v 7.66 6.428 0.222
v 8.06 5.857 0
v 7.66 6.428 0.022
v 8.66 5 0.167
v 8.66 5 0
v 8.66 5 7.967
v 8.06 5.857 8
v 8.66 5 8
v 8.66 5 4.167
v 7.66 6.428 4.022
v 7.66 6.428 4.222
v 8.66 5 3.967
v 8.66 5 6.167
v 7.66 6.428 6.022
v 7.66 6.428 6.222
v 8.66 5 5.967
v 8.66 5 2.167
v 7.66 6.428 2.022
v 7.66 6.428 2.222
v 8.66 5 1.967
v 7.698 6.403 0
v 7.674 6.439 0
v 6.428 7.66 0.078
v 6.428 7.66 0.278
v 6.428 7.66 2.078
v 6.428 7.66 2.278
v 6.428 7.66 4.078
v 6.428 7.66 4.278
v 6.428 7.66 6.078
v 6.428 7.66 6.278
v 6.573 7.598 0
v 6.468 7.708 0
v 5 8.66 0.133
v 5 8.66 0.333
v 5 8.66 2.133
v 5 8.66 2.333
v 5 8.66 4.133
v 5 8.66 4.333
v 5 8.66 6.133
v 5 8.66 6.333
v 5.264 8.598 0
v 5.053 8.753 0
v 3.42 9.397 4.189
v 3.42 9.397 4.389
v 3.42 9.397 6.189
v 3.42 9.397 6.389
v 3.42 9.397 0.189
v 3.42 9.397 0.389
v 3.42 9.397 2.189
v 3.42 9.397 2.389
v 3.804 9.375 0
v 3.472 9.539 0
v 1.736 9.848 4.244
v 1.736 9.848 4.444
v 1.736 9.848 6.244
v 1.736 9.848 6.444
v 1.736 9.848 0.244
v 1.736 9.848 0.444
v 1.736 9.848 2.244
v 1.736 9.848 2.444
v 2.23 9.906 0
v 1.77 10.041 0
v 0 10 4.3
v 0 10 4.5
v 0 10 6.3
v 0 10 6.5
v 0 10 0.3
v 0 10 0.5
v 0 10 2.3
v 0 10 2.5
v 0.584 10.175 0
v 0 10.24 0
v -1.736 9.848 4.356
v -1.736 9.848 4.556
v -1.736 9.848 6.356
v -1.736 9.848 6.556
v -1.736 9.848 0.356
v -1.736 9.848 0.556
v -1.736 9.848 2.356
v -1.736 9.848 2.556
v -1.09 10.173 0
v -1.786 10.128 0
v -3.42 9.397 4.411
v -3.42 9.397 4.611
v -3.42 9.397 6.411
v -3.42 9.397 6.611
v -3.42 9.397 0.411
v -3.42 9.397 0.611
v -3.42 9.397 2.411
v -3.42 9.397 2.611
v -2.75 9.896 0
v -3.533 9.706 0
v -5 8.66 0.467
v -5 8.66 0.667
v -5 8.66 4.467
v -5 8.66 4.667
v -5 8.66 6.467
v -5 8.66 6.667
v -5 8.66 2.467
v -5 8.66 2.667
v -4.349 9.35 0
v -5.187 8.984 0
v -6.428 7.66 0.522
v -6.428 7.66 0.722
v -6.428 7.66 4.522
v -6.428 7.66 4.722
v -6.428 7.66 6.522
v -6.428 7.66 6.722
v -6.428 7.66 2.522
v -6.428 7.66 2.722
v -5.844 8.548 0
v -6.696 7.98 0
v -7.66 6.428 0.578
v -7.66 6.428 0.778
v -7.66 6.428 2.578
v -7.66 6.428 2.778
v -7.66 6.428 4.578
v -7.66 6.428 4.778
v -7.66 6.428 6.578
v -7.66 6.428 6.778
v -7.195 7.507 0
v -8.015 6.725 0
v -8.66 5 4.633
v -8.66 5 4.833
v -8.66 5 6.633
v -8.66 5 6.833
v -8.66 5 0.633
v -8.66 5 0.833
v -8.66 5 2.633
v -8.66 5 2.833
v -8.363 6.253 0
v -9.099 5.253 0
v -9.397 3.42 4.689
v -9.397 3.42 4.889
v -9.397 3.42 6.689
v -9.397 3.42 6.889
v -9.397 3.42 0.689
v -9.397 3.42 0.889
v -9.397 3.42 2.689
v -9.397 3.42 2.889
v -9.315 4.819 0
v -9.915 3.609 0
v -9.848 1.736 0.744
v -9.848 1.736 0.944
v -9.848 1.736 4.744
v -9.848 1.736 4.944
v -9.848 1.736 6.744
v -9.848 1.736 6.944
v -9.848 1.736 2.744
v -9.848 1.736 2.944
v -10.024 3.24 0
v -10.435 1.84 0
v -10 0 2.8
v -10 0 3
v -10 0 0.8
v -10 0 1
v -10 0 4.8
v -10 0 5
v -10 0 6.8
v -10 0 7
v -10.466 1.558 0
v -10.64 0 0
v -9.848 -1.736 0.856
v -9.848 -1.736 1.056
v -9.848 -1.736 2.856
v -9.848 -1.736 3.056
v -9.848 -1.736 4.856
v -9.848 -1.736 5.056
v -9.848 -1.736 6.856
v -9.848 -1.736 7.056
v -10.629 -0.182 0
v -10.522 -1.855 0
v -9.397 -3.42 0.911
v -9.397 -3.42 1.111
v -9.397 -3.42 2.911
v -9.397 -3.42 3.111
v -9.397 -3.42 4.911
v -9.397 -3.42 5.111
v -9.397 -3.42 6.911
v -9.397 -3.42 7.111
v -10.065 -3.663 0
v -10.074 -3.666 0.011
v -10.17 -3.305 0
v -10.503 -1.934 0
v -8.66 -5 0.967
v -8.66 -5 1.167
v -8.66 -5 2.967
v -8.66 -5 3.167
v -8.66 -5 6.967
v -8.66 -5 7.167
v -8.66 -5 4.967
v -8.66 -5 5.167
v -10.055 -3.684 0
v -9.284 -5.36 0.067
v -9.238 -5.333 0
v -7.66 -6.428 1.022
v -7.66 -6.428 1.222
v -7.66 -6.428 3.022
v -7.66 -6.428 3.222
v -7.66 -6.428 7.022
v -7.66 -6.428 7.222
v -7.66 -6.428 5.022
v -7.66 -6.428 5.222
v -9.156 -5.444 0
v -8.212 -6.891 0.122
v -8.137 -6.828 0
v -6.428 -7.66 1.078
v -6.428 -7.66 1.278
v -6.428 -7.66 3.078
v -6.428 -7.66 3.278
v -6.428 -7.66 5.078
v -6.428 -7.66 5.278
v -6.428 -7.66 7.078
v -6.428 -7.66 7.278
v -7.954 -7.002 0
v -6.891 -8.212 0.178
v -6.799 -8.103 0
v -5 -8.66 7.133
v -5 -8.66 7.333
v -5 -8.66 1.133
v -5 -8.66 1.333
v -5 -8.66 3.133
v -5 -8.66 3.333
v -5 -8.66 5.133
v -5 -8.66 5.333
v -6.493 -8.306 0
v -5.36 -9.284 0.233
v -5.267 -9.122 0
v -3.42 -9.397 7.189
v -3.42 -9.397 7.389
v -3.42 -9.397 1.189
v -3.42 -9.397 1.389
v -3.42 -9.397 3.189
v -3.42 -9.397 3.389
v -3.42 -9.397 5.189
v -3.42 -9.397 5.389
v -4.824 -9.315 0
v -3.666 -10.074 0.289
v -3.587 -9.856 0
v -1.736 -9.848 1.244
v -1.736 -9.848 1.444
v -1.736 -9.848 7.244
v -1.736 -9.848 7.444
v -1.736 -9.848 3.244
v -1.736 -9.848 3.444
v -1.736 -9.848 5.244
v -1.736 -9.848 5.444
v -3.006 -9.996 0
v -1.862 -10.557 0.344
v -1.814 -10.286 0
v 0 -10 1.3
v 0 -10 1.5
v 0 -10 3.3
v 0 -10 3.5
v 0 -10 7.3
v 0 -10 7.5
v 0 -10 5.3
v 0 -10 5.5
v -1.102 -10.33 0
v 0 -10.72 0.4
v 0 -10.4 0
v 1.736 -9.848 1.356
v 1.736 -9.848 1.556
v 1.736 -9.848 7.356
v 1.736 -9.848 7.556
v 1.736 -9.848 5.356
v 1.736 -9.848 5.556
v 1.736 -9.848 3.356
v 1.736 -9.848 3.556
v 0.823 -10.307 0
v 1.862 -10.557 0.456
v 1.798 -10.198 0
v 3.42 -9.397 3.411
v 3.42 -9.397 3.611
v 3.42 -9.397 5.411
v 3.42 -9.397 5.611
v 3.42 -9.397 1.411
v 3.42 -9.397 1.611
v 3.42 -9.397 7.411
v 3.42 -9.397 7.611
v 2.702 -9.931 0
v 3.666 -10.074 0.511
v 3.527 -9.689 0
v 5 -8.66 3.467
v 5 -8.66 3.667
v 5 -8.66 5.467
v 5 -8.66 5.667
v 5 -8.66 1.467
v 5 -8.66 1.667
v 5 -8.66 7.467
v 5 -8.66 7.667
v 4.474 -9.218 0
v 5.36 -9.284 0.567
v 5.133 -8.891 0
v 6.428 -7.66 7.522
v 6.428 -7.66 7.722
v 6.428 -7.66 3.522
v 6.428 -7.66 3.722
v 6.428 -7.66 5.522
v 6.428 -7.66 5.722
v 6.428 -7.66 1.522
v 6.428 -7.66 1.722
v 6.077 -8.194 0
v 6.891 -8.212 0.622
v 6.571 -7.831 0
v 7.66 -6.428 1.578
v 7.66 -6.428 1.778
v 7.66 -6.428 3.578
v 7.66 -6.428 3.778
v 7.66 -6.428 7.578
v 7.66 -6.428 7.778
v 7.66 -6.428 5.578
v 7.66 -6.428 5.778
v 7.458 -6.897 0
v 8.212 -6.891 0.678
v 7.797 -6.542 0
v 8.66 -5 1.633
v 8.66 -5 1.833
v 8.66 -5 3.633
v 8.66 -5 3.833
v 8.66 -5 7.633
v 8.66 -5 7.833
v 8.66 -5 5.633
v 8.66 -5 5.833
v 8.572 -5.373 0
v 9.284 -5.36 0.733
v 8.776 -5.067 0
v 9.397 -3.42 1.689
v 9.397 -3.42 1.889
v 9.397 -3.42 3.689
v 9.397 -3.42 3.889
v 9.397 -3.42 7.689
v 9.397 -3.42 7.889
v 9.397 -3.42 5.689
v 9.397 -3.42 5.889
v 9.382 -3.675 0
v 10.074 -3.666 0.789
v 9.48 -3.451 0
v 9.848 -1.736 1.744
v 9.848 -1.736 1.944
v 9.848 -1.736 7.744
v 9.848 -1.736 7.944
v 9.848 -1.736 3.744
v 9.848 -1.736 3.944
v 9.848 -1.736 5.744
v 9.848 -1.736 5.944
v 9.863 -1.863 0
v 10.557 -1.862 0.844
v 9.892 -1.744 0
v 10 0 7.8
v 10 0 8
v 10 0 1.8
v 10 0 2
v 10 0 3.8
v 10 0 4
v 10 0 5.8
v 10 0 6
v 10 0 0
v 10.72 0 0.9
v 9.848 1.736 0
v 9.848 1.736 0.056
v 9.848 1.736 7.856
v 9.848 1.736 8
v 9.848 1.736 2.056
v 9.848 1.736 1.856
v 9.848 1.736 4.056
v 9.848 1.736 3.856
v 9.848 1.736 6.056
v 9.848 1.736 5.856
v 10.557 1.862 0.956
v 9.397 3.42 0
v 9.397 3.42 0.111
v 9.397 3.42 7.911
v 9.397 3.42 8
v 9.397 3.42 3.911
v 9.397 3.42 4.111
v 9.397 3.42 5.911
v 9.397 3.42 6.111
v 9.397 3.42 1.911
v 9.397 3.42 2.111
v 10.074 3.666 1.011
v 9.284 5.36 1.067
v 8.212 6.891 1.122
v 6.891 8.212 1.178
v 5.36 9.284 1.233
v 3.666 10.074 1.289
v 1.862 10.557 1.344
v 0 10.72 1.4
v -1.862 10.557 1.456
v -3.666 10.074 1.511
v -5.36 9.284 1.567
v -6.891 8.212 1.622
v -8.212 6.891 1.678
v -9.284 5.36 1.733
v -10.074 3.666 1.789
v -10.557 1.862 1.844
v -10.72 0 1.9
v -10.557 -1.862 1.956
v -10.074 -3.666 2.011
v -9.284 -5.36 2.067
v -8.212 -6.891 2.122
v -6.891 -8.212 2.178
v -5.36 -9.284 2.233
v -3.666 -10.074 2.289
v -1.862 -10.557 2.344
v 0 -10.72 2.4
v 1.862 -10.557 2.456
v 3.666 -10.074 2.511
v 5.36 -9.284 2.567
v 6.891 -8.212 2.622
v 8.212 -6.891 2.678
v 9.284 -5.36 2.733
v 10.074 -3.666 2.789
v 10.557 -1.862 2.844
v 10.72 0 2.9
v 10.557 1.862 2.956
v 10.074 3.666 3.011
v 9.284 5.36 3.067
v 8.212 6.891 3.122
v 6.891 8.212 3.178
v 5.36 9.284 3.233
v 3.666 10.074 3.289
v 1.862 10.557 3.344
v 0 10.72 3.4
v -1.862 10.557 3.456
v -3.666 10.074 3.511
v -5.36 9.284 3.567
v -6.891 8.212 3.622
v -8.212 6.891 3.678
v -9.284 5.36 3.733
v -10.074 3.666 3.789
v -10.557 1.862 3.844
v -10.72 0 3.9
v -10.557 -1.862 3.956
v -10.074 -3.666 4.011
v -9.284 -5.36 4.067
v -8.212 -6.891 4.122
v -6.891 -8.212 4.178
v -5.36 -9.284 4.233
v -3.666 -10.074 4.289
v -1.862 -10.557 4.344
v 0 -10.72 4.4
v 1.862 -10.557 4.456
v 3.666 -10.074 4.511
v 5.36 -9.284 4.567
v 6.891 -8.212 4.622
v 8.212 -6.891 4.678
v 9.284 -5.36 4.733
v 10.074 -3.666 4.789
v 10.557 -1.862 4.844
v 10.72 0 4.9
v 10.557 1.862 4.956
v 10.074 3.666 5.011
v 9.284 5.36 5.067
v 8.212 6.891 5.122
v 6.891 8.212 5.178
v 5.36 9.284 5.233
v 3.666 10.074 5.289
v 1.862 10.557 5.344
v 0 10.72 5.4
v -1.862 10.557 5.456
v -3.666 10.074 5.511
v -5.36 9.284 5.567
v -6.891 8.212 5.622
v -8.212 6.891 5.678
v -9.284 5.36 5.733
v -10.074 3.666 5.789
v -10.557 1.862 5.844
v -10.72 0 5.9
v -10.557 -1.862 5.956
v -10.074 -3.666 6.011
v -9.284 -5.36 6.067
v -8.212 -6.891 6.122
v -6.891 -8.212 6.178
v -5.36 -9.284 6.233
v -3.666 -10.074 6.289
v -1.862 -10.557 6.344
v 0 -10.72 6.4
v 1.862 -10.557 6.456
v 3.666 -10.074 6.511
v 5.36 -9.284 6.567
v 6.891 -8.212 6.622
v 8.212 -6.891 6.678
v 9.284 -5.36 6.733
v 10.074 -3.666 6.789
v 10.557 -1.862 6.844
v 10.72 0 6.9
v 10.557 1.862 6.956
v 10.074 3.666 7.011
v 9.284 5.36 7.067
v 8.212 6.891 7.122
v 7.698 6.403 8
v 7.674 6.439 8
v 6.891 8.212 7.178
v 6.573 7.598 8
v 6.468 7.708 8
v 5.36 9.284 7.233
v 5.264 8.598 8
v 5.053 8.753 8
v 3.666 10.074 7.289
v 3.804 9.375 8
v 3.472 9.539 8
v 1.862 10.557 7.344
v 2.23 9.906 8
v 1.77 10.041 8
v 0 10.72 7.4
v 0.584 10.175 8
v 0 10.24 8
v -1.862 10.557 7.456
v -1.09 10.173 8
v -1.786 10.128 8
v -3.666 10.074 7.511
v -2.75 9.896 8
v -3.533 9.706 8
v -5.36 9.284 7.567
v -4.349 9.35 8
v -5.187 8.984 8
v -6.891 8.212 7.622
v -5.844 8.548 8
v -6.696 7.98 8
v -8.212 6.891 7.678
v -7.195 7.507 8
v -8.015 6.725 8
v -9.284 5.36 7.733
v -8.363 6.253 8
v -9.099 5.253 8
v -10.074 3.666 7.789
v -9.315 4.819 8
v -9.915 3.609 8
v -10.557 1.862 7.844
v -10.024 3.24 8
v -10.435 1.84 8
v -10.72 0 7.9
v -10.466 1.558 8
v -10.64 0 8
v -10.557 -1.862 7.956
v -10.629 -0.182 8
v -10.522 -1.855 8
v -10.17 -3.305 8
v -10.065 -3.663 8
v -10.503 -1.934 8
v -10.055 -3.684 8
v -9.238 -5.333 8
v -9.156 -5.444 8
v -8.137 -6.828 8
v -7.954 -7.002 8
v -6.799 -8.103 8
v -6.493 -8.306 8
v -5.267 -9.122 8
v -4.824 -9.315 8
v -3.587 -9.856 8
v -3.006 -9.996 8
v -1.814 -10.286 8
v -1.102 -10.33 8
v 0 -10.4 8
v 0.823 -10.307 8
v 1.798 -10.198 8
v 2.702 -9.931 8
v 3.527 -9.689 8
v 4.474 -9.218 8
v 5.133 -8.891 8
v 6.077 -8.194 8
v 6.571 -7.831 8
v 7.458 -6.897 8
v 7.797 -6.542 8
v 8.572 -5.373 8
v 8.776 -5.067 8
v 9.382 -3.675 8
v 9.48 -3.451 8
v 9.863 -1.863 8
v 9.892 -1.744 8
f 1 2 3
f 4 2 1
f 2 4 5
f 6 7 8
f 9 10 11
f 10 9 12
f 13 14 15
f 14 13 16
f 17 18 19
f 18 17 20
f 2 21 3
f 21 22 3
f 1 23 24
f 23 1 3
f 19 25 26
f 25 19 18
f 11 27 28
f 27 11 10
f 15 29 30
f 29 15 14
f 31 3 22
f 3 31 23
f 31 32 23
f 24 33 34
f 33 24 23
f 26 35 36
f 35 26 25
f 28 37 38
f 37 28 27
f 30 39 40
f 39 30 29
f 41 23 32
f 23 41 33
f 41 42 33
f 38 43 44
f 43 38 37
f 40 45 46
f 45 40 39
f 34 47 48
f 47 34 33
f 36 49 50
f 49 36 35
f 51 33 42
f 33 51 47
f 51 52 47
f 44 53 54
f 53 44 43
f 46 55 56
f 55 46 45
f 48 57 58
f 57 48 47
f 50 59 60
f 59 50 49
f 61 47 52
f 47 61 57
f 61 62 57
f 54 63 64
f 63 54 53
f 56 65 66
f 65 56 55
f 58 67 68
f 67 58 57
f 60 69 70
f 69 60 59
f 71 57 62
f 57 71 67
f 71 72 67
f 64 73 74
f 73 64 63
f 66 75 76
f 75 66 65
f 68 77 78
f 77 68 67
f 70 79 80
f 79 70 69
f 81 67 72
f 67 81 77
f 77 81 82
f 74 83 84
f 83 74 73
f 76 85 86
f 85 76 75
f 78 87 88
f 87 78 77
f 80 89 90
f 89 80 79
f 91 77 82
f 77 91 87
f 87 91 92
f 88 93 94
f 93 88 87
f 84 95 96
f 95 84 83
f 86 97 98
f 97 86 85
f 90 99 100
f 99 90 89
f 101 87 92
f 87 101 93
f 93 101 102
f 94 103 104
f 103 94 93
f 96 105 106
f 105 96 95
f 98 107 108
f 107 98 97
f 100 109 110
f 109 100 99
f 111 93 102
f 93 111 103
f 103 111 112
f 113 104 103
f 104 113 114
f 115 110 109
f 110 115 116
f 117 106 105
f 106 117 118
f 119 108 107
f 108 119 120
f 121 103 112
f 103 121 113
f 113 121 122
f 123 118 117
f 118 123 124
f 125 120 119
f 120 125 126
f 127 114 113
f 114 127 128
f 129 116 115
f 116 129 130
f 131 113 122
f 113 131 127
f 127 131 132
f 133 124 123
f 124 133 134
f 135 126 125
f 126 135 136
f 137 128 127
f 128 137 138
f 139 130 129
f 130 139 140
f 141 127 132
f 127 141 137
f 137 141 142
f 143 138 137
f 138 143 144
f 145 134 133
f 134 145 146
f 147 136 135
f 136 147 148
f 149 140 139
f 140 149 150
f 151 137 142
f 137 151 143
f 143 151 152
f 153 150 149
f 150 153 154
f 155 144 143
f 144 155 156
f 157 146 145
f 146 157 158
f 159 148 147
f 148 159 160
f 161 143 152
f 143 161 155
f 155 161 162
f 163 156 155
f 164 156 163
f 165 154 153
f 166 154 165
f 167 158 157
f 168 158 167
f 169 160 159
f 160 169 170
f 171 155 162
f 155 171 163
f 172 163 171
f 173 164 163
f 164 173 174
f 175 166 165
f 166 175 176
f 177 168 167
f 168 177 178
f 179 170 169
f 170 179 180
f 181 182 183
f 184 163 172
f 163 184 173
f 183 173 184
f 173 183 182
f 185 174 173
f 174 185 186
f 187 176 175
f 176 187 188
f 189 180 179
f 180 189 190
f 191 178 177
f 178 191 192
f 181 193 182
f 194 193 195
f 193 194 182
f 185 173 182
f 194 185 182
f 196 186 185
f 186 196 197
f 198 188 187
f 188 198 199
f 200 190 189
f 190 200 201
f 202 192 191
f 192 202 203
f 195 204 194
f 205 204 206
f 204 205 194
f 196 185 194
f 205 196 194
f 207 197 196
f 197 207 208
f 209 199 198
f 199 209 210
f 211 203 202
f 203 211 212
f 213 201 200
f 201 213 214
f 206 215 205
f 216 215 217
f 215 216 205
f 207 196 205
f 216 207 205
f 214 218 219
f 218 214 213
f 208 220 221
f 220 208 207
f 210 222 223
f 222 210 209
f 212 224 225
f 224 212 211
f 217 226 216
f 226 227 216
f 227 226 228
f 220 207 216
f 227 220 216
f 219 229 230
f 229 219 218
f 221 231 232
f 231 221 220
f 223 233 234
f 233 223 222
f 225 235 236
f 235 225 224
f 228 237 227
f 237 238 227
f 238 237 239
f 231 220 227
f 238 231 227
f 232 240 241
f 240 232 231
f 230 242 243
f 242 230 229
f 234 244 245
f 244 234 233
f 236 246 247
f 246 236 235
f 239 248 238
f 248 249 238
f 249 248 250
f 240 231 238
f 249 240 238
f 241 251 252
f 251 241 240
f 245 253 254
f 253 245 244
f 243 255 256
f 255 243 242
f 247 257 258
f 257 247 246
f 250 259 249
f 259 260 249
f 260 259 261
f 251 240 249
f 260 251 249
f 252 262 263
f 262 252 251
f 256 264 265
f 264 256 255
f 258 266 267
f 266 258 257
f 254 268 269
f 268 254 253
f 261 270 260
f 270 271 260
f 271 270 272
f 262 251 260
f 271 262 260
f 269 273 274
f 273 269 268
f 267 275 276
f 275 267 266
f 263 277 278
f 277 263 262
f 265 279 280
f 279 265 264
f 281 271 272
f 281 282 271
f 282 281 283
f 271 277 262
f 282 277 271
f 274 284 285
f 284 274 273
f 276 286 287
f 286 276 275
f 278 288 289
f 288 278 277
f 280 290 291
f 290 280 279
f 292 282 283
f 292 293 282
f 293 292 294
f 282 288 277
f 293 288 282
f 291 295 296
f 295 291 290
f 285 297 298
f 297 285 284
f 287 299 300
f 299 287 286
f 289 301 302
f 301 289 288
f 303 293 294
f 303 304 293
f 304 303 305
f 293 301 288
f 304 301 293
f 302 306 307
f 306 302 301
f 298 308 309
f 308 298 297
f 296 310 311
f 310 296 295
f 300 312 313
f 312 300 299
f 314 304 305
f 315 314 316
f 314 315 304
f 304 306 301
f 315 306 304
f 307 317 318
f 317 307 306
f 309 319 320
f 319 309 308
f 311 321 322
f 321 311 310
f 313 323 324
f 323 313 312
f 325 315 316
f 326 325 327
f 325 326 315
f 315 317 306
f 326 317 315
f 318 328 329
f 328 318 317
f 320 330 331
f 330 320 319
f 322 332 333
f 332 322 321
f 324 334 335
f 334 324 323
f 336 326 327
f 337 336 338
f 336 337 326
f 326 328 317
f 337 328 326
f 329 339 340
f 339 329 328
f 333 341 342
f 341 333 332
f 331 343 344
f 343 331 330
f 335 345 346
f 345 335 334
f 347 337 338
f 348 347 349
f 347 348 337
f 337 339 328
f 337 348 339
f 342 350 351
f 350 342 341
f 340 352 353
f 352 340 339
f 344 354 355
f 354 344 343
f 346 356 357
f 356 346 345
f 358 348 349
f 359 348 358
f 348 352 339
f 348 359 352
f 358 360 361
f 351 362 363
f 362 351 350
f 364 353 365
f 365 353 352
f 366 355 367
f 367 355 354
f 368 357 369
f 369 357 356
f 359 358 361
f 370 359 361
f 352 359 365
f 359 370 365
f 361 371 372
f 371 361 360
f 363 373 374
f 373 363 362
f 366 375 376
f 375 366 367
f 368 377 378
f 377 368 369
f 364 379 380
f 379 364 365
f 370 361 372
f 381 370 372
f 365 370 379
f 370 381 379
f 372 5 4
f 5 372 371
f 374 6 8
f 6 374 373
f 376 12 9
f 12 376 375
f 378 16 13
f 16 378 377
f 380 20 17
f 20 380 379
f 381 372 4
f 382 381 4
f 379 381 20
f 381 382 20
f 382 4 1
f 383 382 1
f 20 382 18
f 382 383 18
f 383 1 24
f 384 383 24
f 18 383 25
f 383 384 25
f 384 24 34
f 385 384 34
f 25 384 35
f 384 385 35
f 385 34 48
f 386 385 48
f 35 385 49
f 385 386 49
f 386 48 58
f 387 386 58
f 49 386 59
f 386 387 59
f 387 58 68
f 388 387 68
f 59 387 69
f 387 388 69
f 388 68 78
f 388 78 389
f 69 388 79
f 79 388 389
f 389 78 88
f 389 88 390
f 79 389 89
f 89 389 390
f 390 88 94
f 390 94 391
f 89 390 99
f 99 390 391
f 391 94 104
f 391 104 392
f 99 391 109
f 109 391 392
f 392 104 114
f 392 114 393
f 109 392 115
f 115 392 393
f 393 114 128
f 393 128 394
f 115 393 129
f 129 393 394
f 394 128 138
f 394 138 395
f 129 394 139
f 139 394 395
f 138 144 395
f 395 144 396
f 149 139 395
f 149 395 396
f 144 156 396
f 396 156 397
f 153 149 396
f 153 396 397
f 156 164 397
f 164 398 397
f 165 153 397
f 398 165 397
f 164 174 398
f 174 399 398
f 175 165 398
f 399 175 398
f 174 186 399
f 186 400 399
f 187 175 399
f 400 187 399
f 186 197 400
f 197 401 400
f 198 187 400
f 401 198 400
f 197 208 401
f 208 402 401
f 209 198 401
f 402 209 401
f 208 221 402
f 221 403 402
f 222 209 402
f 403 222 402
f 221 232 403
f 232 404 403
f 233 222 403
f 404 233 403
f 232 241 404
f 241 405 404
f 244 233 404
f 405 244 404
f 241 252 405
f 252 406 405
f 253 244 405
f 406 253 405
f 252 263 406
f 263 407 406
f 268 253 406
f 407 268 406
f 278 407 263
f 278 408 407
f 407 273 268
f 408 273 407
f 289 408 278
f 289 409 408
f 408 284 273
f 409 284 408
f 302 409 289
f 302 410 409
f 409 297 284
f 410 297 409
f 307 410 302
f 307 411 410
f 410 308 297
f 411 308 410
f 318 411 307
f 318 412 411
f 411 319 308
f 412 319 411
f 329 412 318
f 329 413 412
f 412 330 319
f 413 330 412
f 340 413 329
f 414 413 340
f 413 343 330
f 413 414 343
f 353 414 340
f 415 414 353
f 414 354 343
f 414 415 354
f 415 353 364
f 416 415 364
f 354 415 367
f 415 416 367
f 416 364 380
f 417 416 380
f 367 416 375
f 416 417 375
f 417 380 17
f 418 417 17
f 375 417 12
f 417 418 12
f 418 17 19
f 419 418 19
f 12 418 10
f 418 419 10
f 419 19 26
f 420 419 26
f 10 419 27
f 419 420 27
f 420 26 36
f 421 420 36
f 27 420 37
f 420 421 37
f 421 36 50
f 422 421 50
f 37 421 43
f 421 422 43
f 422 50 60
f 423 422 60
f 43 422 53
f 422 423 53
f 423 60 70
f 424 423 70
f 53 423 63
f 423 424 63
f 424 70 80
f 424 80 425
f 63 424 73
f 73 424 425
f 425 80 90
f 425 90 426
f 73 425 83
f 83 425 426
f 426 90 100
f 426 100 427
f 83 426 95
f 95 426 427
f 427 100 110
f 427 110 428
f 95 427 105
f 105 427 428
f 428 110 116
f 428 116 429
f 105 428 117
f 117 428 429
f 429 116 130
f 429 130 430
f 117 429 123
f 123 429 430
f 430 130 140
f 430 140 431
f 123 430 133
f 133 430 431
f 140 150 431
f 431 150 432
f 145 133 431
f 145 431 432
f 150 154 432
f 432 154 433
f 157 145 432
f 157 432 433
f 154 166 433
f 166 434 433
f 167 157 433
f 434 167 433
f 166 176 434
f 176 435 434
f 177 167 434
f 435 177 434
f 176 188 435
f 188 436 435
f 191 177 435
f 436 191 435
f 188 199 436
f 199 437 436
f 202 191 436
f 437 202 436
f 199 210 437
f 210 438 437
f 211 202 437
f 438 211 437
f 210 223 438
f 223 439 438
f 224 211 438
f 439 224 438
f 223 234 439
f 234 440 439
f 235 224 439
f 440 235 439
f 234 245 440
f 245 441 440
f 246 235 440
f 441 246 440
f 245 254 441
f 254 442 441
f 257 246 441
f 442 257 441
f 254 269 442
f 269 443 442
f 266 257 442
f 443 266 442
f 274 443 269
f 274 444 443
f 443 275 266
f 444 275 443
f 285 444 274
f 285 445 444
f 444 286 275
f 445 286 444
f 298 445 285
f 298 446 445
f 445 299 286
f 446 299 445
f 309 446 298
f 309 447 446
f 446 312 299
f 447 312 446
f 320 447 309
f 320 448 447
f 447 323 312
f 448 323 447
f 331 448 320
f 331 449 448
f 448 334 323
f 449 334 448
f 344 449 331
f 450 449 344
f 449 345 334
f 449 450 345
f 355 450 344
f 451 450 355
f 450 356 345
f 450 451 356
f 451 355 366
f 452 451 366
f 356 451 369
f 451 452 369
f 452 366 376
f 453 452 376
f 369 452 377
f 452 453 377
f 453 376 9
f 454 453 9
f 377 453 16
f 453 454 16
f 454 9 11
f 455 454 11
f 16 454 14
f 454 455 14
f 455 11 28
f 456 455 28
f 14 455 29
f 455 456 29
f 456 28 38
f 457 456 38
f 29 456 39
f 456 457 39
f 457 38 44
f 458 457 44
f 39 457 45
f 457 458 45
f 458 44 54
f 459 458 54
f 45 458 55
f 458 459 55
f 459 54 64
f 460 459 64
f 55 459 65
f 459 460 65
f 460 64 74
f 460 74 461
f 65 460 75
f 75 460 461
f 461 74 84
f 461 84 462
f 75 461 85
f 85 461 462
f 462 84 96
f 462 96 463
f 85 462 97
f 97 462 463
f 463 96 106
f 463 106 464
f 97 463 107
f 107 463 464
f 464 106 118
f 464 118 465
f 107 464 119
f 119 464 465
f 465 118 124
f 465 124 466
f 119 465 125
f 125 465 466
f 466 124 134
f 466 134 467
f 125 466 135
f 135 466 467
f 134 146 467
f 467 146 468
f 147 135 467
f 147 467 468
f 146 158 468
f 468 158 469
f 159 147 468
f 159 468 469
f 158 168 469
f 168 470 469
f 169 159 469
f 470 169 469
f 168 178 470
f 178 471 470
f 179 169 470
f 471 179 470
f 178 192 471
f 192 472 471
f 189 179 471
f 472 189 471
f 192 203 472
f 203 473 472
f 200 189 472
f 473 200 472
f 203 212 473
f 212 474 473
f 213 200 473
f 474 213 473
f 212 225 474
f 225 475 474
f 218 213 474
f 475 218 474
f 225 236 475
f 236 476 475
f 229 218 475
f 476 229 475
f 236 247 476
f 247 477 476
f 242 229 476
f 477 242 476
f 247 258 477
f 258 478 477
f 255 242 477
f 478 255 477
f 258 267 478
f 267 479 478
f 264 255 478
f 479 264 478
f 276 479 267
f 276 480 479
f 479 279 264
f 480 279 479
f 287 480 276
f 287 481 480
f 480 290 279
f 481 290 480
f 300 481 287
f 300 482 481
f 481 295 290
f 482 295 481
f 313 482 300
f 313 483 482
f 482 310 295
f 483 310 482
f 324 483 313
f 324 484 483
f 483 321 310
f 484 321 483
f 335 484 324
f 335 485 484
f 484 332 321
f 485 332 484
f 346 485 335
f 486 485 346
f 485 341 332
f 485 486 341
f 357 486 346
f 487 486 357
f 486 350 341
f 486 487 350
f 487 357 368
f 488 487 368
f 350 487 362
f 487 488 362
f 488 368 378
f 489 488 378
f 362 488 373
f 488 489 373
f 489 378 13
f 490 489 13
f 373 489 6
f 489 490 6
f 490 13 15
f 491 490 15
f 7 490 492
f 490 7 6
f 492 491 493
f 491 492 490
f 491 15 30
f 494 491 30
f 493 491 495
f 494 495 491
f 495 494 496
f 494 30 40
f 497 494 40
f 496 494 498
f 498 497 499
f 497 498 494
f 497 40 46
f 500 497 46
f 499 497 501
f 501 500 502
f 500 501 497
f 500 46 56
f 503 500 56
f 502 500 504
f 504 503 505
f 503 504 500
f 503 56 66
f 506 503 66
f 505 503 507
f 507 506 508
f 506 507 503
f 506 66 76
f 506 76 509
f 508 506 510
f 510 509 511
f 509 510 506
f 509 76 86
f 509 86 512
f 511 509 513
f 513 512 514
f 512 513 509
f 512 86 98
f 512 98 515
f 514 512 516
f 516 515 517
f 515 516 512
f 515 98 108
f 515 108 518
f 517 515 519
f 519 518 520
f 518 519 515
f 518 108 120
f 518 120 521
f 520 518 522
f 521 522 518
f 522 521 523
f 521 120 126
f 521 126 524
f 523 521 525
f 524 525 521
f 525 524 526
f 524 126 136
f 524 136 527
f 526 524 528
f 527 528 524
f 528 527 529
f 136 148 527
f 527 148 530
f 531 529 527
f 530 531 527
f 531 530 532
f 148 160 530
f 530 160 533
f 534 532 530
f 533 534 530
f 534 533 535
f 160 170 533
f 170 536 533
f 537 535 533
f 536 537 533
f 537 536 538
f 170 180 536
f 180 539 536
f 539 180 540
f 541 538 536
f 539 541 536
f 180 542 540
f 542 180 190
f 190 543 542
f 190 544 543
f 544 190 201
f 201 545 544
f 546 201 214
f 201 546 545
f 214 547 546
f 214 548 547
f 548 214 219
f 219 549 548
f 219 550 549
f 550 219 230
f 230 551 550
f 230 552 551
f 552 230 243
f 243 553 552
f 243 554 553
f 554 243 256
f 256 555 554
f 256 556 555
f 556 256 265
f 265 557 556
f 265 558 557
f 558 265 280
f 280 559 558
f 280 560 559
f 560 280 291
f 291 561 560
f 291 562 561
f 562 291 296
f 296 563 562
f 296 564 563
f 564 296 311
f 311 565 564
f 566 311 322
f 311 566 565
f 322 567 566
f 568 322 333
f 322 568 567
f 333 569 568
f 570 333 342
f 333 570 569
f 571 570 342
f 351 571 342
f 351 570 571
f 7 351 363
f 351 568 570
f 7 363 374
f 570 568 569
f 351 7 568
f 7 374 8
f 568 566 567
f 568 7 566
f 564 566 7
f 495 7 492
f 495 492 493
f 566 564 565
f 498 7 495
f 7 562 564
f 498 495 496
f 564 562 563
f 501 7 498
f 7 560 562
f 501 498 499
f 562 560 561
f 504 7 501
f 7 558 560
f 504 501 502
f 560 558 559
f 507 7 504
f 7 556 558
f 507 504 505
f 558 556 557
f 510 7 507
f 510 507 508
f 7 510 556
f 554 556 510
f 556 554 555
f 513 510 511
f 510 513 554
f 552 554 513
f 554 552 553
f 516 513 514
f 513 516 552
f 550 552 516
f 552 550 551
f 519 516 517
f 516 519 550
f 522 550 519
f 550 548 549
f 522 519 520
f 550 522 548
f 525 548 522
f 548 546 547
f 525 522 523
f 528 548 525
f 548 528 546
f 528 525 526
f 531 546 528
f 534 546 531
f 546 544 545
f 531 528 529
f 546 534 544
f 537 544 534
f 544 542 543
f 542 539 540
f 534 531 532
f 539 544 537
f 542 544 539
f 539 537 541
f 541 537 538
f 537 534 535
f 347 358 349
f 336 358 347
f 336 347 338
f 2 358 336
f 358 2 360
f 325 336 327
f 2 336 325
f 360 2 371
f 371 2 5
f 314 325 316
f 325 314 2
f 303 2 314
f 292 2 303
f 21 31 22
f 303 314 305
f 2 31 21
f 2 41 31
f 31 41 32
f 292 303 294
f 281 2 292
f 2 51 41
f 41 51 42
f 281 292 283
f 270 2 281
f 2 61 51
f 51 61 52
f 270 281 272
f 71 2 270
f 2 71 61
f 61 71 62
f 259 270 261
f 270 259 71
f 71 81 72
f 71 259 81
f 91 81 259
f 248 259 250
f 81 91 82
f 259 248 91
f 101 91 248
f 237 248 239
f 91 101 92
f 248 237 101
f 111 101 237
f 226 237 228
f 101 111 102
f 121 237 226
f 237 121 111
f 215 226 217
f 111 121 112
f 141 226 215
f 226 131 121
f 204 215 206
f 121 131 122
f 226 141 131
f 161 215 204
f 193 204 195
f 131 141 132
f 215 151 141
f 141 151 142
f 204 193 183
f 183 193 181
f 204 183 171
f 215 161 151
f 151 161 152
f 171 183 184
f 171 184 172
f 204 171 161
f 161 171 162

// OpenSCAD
// OpenSCAD screw thread module
// Produced by Jonathan Waite CUED 2013
// jpw54@cam.ac.uk

/*
      |--h--|

  ~  1|\
  |   | \
  |   |  \
  |   |   \
  |   |    \ 2
  |   |     |   ~
  Z1  |     |   |
  |   |     |   |
  |   |    / 3  |   ~
  |   |   /     Z2  |
  |   |  /      |   Z3
  |   | /       |   |
  ~  0|/        ~   ~
*/

/*		//draw intrenal thread
difference(){
	translate([0,0,1])
		cylinder(8,r=15);
		Thread(8,10,2,36,true);
}
*/
/*		//visualise clearance volume
difference(){
	Thread(8,6,2,36,true);
	translate([0,0,0.1]*1.5)
		Thread(8,6,2,36,false);
}
*/
Thread();

module Thread(radius=10,length=8,pitch=2,steps=36,internal=false,
					threadratio=[0.4,1.0,0.5,0.5],		
					tolerance=0.1){
	
	//convert from ratios to lengths, threaddim=[h, z1, z2, z3]
	threaddim=threadratio*pitch;				
	//add to shaft radius for internal thread
	shaftradius=radius+(internal ? tolerance : 0)*pitch;	
														
	difference(){
		union(){
			//shaft infill
			cylinder(length,r=shaftradius,$fn=steps);		
			//add extra thread to be trimmed for smooth thread ends
			translate([0,0,-pitch])
				DrawThread(radius,length+pitch*2,pitch,threaddim,steps,internal,tolerance);
		}								
		//trim bottom of thread
		translate([0,0,-pitch*1.5])
			cylinder(pitch*1.5,r=(radius+threaddim[0])*1.5);	
		//trim top of thread
		translate([0,0,length])
			cylinder(pitch*1.5,r=(radius+threaddim[0])*1.5);	
	}
}

module DrawThread(radius=10,length=8,pitch=2,
							threaddim=[0.8,2.0,1.0,1.0],
							steps=36,internal=false,tolerance=0.1){

	zinc=pitch/steps;
	stepangle=360/steps;
	//draws thread exactly as long as 'length'
	stepstotal=steps*(length/pitch-1);		

		for (stepscurrent=[0:stepstotal-1]) {
			ThreadElement(radius,threaddim,zinc,stepangle,stepscurrent,tolerance,internal);
		}
}

module ThreadElement(radius=10,threaddim=[0.8,2.0,1.0,1.0],
							zinc=2/360,stepangle=5,stepscurrent=0,
							tolerance=0.1, internal=false){

/* Left-hand face of polyhedron (side A, looking towards thread's centre)

      |--h--|

  ~  1|\
  |   | \
  |   |  \
  |   |   \
  |   |    \ 2
  |   |     |   ~
  Z1  |     |   |
  |   |     |   |
  |   |    / 3  |   ~
  |   |   /     Z2  |
  |   |  /      |   Z3
  |   | /       |   |
  ~  0|/        ~   ~

*/ //Right-hand face (side B) is numbered 4:7

	//add clearances to thread
	thread=threaddim*(1+(internal ? tolerance : -tolerance));	

	thetaA=stepangle*stepscurrent;
	thetaB=thetaA+stepangle;
	z0A=zinc*stepscurrent;
	z0B=z0A+zinc;
	xA=cos(thetaA);
	xB=cos(thetaB);
	yA=sin(thetaA);
	yB=sin(thetaB);
	r=radius;
	R=radius+thread[0];	//thread protrudes from shaft
	
	//draw the element
	polyhedron(		
		points=[
			[r*xA,r*yA,z0A],	   		//0
			[r*xA,r*yA,z0A+thread[1]], //1
			[R*xA,R*yA,z0A+thread[2]], //2
			[R*xA,R*yA,z0A+thread[3]], //3
			[r*xB,r*yB,z0B],    			//4
			[r*xB,r*yB,z0B+thread[1]], //5
			[R*xB,R*yB,z0B+thread[2]],	//6
			[R*xB,R*yB,z0B+thread[3]]	//7
		],
		triangles=[
			[0,1,2],
			[0,2,3],	//left
			[0,4,1],
			[1,4,5],	//back
			[0,3,4],
			[4,3,7],	//bottom
			[2,6,3],
			[3,6,7],	//front
			[1,5,2],
			[2,5,6],	//top
			[4,6,5],
			[4,7,6]	//right
		]
	);
}
